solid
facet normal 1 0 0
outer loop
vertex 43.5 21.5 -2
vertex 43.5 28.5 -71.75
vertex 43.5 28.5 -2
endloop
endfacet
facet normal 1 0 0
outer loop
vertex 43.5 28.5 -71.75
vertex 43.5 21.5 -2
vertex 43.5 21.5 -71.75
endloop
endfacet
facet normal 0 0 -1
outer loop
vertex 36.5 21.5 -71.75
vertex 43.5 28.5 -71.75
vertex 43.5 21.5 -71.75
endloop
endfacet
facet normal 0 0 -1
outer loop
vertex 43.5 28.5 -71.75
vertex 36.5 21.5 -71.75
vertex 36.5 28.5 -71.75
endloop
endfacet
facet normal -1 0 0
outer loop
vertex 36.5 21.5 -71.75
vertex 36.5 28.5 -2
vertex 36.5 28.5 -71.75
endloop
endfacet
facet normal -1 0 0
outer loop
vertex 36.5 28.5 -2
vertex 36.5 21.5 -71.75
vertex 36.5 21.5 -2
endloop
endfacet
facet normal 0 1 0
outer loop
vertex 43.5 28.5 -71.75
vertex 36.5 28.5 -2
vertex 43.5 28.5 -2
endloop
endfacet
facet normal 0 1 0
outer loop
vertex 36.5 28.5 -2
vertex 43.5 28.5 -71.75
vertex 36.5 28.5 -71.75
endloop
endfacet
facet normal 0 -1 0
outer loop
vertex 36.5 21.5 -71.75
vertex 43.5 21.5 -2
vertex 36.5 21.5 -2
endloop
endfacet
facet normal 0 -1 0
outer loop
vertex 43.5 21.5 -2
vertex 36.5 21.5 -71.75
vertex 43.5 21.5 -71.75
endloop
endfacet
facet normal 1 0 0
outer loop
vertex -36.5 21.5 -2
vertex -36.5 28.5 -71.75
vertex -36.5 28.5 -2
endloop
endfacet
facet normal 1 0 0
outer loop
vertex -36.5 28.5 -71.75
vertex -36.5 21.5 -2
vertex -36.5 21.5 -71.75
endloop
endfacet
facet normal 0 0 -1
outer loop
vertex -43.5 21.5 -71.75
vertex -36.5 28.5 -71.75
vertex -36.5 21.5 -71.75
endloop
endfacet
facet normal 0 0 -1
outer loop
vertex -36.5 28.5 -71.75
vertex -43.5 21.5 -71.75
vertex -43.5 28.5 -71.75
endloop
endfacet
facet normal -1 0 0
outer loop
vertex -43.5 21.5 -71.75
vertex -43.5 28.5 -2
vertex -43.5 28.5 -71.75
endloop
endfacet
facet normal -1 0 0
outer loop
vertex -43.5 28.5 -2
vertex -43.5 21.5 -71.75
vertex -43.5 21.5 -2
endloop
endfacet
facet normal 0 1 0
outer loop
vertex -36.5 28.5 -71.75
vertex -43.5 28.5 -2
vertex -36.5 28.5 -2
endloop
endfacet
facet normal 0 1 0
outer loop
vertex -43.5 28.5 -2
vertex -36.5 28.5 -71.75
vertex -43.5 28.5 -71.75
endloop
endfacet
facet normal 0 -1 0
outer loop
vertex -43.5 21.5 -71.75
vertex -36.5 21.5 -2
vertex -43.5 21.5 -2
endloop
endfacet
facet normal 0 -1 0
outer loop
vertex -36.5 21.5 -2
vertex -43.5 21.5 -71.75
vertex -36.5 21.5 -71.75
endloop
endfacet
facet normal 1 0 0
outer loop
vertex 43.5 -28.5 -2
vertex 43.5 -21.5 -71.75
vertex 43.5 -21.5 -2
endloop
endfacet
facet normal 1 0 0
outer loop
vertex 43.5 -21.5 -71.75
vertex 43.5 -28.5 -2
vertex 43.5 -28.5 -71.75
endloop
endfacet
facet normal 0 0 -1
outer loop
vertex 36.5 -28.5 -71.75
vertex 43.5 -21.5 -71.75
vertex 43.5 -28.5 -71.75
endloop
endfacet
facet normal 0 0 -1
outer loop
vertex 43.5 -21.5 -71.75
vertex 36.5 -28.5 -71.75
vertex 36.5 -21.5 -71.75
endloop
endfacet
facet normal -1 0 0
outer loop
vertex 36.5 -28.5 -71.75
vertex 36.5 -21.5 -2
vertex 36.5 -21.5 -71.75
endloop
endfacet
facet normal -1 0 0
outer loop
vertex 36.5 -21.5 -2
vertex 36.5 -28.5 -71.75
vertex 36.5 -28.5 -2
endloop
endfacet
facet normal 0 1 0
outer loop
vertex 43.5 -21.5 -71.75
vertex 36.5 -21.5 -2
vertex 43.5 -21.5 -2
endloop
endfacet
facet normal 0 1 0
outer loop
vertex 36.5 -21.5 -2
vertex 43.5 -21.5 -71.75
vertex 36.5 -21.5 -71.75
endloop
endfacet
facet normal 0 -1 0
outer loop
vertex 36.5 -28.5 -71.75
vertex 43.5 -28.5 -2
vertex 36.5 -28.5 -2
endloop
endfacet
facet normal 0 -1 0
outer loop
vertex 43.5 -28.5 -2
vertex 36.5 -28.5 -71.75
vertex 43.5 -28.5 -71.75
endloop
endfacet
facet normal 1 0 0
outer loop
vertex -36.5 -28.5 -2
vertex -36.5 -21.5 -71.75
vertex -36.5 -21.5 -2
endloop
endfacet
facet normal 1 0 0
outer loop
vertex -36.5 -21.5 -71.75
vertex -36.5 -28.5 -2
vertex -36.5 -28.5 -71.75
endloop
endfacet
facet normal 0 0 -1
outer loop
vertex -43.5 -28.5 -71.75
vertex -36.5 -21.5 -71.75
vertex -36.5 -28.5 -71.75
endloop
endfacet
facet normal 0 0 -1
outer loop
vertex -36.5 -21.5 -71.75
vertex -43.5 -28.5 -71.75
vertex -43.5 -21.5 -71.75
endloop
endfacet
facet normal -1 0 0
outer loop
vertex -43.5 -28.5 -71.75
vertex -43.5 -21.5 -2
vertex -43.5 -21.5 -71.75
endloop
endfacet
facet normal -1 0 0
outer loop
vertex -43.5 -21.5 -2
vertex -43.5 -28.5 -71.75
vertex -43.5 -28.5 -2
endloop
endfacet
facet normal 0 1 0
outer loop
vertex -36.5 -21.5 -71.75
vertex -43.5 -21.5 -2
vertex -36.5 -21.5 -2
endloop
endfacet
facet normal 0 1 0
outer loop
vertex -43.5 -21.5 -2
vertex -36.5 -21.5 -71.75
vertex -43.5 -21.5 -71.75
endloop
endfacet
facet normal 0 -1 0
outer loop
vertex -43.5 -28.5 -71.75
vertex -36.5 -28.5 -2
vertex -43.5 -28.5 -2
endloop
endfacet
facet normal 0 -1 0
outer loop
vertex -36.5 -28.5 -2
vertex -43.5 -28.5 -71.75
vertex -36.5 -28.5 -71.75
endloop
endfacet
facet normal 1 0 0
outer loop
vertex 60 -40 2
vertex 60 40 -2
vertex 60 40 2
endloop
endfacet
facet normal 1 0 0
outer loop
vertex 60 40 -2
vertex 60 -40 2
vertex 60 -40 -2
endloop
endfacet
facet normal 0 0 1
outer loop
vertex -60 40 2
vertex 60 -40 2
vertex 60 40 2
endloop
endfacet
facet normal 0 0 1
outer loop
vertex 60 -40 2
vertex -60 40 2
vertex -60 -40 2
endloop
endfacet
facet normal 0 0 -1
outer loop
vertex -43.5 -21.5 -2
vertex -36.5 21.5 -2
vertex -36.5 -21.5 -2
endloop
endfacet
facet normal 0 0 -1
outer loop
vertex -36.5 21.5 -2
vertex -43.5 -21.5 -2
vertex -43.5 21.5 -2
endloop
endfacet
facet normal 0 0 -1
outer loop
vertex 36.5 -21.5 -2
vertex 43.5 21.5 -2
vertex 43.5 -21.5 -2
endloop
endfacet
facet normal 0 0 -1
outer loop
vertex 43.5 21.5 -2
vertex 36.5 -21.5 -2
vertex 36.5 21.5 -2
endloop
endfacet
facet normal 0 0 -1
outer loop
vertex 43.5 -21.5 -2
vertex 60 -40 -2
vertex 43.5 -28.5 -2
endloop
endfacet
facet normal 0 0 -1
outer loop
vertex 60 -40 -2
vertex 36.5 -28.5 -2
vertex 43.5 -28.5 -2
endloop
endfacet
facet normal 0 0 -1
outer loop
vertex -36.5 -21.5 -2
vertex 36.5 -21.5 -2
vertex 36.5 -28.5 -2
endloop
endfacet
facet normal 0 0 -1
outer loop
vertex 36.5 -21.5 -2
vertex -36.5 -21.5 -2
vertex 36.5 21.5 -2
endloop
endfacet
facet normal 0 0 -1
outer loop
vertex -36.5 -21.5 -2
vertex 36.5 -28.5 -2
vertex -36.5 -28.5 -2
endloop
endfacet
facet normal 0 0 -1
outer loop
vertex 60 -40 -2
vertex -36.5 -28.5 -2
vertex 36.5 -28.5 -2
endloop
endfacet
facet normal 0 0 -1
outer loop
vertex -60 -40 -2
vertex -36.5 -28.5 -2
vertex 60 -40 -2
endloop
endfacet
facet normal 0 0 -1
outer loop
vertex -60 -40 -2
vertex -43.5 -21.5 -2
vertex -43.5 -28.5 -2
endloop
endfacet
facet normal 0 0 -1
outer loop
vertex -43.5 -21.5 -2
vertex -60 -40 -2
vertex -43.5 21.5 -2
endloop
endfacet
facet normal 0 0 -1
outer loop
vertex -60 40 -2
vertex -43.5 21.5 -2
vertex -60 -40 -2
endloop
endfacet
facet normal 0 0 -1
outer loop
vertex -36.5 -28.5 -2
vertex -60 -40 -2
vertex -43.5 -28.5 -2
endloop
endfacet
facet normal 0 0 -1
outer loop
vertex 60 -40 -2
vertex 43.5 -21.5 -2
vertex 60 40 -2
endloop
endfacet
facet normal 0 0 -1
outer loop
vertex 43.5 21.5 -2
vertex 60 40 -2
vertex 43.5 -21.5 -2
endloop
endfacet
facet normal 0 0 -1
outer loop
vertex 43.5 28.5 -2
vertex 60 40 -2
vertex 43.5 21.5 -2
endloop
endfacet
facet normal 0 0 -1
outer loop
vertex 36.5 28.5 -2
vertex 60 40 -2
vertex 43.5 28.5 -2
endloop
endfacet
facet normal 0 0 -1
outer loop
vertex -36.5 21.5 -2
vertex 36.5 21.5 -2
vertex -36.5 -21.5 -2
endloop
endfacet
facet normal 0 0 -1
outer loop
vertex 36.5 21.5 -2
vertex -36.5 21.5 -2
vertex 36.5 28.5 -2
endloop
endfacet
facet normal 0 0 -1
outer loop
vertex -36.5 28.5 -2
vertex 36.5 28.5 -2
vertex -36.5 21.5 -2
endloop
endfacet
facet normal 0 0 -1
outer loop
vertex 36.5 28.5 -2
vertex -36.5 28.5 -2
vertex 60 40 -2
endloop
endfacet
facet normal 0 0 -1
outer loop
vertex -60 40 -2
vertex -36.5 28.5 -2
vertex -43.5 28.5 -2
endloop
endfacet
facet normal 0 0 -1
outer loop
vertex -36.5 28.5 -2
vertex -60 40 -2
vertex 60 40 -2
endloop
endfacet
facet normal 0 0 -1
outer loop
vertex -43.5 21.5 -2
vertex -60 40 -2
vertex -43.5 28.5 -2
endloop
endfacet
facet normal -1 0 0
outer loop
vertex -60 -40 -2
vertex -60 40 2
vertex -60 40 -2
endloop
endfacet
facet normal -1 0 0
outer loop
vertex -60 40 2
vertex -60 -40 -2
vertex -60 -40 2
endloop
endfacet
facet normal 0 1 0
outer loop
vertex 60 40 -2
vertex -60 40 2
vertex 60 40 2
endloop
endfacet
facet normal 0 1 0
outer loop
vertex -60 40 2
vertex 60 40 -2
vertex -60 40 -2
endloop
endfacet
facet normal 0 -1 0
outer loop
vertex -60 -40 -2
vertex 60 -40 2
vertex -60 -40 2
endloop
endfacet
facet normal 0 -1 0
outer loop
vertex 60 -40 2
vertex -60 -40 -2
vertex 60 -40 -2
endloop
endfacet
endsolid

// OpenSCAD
// file: pied_carre_long.scad
module pied_carre_long()
{
	translate([0,0,-35])
cube(size = [7,7,70], center = true);

}
// file: plateau_rectangulaire.scad
module plateau_rectangulaire()
{
	cube(size = [120,80,4], center = true);
}
// main file
use <plateau_rectangulaire.scad>;
use <pied_carre_long.scad>;






module table()
{
	translate([40,25,-1.75]) pied_carre_long();
	translate([-40,25,-1.75]) pied_carre_long();
	translate([40,-25,-1.75]) pied_carre_long();
	translate([-40,-25,-1.75]) pied_carre_long();
	plateau_rectangulaire();
}

table();
